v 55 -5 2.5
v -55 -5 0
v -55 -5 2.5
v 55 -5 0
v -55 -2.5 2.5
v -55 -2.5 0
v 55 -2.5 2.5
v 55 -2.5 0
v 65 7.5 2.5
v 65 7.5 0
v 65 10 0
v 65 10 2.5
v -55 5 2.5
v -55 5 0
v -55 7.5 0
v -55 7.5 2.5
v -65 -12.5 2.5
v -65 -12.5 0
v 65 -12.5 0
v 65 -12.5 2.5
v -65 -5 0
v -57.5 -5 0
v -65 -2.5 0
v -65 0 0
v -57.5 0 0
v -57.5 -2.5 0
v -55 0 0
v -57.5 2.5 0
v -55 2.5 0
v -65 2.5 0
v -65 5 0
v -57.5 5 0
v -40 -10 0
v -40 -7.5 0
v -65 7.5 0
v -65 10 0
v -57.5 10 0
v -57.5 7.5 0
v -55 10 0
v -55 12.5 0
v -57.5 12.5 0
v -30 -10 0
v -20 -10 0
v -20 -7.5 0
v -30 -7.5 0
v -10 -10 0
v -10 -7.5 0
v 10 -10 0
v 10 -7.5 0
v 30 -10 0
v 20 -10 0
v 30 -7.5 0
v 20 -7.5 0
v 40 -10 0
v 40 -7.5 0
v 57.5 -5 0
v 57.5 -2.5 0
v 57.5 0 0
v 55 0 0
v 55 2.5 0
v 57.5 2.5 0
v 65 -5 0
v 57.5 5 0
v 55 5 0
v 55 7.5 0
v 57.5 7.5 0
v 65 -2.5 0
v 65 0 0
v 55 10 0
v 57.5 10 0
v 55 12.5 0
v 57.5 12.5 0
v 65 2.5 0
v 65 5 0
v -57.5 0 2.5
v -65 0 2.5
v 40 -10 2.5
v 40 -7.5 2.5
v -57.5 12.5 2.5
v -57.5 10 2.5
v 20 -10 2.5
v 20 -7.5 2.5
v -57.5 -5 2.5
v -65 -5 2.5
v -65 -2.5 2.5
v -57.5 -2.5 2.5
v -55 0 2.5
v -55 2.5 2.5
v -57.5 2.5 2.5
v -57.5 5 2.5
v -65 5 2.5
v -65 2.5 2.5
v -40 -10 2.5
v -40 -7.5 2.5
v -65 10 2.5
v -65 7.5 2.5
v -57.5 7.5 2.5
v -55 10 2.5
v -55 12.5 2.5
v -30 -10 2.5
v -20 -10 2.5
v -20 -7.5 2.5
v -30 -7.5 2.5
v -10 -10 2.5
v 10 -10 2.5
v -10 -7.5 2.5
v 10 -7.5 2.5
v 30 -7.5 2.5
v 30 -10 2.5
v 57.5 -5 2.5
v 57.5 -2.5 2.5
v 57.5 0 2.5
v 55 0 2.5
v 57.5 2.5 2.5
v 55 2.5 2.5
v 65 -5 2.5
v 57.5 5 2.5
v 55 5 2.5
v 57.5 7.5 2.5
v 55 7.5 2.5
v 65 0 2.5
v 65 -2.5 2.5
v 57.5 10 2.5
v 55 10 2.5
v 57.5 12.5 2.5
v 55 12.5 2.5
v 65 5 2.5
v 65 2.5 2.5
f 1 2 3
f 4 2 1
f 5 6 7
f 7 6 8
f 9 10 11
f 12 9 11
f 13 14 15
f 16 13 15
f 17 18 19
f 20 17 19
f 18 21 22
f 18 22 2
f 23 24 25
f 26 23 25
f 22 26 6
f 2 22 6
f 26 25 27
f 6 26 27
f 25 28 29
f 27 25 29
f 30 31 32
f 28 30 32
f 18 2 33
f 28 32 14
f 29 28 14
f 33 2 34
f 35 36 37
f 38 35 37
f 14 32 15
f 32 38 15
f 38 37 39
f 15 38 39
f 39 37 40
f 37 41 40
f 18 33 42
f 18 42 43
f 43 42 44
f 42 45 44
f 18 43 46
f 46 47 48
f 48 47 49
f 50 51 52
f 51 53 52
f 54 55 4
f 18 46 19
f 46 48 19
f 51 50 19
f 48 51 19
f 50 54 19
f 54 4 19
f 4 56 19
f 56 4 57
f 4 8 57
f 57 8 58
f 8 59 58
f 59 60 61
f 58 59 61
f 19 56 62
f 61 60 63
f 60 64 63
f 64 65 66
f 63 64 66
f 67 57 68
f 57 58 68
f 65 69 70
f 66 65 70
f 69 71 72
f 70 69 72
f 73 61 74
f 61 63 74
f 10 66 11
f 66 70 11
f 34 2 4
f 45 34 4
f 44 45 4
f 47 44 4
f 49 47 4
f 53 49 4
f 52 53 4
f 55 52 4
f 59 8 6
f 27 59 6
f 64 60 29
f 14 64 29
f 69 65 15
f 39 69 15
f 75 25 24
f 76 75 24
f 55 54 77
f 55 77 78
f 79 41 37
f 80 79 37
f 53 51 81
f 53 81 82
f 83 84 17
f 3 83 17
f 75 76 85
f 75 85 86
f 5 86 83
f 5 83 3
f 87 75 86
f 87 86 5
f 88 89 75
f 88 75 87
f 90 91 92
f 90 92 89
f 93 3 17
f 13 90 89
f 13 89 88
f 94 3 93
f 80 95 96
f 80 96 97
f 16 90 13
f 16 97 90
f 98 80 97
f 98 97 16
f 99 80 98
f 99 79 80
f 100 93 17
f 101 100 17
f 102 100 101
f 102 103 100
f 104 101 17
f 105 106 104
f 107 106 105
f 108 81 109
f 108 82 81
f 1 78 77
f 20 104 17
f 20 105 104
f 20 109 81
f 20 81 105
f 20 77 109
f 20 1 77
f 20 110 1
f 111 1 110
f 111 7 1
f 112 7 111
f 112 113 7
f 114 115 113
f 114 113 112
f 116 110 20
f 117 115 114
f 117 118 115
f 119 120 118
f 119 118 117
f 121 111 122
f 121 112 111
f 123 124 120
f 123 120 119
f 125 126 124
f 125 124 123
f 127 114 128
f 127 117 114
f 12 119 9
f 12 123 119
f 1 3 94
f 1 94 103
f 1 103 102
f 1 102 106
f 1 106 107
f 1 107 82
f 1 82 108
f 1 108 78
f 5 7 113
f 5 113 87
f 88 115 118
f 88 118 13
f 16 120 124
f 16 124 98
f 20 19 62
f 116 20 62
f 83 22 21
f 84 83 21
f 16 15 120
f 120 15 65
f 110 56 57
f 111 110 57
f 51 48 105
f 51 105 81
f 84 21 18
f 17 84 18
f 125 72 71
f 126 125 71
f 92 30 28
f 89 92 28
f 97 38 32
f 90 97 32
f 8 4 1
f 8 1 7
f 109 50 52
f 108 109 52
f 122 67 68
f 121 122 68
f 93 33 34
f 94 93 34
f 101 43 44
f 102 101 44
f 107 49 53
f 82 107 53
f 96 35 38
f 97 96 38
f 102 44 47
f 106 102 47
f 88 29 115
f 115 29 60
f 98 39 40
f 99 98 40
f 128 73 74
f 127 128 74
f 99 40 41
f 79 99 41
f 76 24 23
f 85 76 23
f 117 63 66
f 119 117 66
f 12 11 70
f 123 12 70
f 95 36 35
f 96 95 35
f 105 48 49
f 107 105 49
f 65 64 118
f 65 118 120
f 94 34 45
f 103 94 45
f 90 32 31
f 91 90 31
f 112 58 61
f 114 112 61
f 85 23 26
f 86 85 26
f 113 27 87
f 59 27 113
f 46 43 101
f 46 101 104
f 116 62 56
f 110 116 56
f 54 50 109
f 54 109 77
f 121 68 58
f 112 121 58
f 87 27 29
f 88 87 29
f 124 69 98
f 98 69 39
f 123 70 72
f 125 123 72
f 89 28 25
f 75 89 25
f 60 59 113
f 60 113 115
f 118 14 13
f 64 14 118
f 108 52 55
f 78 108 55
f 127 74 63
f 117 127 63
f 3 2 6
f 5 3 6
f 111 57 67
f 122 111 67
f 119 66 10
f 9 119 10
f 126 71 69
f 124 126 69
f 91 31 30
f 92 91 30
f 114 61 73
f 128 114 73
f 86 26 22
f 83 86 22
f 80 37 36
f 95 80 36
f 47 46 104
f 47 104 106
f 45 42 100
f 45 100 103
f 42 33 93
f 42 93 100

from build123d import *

# Parameters (mm, degrees)
SKETCH1_W           = 110
SKETCH1_H           = 2.5
SKETCH1_W_2         = 10
BOSS_EXTRUDE1_DEPTH = 2.5


with BuildPart() as part:
    # Sketch1 → Boss-Extrude1 (new body)
    with BuildSketch(Plane.XY):
        Polygon((-65, -12.5), (65, -12.5), (65, -5), (57.5, -5), (57.5, -2.5), (65, -2.5), (65, 0), (57.5, 0), (57.5, 2.5), (65, 2.5), (65, 5), (57.5, 5), (57.5, 7.5), (65, 7.5), (65, 10), (57.5, 10), (57.5, 12.5), (55, 12.5), (55, 10), (-55, 10), (-55, 12.5), (-57.5, 12.5), (-57.5, 10), (-65, 10), (-65, 7.5), (-57.5, 7.5), (-57.5, 5), (-65, 5), (-65, 2.5), (-57.5, 2.5), (-57.5, 0), (-65, 0), (-65, -2.5), (-57.5, -2.5), (-57.5, -5), (-65, -5), align=None)
        with Locations((0, -3.75)):
            Rectangle(SKETCH1_W, SKETCH1_H, mode=Mode.SUBTRACT)
        with Locations((0, 6.25)):
            Rectangle(SKETCH1_W, SKETCH1_H, mode=Mode.SUBTRACT)
        with Locations((0, 1.25)):
            Rectangle(SKETCH1_W, SKETCH1_H, mode=Mode.SUBTRACT)
        with Locations((-15, -8.75)):
            Rectangle(SKETCH1_W_2, SKETCH1_H, mode=Mode.SUBTRACT)
        with Locations((-35, -8.75)):
            Rectangle(SKETCH1_W_2, SKETCH1_H, mode=Mode.SUBTRACT)
        with Locations((15, -8.75)):
            Rectangle(SKETCH1_W_2, SKETCH1_H, mode=Mode.SUBTRACT)
        with Locations((35, -8.75)):
            Rectangle(SKETCH1_W_2, SKETCH1_H, mode=Mode.SUBTRACT)
    extrude(amount=BOSS_EXTRUDE1_DEPTH)


solid = part.part
